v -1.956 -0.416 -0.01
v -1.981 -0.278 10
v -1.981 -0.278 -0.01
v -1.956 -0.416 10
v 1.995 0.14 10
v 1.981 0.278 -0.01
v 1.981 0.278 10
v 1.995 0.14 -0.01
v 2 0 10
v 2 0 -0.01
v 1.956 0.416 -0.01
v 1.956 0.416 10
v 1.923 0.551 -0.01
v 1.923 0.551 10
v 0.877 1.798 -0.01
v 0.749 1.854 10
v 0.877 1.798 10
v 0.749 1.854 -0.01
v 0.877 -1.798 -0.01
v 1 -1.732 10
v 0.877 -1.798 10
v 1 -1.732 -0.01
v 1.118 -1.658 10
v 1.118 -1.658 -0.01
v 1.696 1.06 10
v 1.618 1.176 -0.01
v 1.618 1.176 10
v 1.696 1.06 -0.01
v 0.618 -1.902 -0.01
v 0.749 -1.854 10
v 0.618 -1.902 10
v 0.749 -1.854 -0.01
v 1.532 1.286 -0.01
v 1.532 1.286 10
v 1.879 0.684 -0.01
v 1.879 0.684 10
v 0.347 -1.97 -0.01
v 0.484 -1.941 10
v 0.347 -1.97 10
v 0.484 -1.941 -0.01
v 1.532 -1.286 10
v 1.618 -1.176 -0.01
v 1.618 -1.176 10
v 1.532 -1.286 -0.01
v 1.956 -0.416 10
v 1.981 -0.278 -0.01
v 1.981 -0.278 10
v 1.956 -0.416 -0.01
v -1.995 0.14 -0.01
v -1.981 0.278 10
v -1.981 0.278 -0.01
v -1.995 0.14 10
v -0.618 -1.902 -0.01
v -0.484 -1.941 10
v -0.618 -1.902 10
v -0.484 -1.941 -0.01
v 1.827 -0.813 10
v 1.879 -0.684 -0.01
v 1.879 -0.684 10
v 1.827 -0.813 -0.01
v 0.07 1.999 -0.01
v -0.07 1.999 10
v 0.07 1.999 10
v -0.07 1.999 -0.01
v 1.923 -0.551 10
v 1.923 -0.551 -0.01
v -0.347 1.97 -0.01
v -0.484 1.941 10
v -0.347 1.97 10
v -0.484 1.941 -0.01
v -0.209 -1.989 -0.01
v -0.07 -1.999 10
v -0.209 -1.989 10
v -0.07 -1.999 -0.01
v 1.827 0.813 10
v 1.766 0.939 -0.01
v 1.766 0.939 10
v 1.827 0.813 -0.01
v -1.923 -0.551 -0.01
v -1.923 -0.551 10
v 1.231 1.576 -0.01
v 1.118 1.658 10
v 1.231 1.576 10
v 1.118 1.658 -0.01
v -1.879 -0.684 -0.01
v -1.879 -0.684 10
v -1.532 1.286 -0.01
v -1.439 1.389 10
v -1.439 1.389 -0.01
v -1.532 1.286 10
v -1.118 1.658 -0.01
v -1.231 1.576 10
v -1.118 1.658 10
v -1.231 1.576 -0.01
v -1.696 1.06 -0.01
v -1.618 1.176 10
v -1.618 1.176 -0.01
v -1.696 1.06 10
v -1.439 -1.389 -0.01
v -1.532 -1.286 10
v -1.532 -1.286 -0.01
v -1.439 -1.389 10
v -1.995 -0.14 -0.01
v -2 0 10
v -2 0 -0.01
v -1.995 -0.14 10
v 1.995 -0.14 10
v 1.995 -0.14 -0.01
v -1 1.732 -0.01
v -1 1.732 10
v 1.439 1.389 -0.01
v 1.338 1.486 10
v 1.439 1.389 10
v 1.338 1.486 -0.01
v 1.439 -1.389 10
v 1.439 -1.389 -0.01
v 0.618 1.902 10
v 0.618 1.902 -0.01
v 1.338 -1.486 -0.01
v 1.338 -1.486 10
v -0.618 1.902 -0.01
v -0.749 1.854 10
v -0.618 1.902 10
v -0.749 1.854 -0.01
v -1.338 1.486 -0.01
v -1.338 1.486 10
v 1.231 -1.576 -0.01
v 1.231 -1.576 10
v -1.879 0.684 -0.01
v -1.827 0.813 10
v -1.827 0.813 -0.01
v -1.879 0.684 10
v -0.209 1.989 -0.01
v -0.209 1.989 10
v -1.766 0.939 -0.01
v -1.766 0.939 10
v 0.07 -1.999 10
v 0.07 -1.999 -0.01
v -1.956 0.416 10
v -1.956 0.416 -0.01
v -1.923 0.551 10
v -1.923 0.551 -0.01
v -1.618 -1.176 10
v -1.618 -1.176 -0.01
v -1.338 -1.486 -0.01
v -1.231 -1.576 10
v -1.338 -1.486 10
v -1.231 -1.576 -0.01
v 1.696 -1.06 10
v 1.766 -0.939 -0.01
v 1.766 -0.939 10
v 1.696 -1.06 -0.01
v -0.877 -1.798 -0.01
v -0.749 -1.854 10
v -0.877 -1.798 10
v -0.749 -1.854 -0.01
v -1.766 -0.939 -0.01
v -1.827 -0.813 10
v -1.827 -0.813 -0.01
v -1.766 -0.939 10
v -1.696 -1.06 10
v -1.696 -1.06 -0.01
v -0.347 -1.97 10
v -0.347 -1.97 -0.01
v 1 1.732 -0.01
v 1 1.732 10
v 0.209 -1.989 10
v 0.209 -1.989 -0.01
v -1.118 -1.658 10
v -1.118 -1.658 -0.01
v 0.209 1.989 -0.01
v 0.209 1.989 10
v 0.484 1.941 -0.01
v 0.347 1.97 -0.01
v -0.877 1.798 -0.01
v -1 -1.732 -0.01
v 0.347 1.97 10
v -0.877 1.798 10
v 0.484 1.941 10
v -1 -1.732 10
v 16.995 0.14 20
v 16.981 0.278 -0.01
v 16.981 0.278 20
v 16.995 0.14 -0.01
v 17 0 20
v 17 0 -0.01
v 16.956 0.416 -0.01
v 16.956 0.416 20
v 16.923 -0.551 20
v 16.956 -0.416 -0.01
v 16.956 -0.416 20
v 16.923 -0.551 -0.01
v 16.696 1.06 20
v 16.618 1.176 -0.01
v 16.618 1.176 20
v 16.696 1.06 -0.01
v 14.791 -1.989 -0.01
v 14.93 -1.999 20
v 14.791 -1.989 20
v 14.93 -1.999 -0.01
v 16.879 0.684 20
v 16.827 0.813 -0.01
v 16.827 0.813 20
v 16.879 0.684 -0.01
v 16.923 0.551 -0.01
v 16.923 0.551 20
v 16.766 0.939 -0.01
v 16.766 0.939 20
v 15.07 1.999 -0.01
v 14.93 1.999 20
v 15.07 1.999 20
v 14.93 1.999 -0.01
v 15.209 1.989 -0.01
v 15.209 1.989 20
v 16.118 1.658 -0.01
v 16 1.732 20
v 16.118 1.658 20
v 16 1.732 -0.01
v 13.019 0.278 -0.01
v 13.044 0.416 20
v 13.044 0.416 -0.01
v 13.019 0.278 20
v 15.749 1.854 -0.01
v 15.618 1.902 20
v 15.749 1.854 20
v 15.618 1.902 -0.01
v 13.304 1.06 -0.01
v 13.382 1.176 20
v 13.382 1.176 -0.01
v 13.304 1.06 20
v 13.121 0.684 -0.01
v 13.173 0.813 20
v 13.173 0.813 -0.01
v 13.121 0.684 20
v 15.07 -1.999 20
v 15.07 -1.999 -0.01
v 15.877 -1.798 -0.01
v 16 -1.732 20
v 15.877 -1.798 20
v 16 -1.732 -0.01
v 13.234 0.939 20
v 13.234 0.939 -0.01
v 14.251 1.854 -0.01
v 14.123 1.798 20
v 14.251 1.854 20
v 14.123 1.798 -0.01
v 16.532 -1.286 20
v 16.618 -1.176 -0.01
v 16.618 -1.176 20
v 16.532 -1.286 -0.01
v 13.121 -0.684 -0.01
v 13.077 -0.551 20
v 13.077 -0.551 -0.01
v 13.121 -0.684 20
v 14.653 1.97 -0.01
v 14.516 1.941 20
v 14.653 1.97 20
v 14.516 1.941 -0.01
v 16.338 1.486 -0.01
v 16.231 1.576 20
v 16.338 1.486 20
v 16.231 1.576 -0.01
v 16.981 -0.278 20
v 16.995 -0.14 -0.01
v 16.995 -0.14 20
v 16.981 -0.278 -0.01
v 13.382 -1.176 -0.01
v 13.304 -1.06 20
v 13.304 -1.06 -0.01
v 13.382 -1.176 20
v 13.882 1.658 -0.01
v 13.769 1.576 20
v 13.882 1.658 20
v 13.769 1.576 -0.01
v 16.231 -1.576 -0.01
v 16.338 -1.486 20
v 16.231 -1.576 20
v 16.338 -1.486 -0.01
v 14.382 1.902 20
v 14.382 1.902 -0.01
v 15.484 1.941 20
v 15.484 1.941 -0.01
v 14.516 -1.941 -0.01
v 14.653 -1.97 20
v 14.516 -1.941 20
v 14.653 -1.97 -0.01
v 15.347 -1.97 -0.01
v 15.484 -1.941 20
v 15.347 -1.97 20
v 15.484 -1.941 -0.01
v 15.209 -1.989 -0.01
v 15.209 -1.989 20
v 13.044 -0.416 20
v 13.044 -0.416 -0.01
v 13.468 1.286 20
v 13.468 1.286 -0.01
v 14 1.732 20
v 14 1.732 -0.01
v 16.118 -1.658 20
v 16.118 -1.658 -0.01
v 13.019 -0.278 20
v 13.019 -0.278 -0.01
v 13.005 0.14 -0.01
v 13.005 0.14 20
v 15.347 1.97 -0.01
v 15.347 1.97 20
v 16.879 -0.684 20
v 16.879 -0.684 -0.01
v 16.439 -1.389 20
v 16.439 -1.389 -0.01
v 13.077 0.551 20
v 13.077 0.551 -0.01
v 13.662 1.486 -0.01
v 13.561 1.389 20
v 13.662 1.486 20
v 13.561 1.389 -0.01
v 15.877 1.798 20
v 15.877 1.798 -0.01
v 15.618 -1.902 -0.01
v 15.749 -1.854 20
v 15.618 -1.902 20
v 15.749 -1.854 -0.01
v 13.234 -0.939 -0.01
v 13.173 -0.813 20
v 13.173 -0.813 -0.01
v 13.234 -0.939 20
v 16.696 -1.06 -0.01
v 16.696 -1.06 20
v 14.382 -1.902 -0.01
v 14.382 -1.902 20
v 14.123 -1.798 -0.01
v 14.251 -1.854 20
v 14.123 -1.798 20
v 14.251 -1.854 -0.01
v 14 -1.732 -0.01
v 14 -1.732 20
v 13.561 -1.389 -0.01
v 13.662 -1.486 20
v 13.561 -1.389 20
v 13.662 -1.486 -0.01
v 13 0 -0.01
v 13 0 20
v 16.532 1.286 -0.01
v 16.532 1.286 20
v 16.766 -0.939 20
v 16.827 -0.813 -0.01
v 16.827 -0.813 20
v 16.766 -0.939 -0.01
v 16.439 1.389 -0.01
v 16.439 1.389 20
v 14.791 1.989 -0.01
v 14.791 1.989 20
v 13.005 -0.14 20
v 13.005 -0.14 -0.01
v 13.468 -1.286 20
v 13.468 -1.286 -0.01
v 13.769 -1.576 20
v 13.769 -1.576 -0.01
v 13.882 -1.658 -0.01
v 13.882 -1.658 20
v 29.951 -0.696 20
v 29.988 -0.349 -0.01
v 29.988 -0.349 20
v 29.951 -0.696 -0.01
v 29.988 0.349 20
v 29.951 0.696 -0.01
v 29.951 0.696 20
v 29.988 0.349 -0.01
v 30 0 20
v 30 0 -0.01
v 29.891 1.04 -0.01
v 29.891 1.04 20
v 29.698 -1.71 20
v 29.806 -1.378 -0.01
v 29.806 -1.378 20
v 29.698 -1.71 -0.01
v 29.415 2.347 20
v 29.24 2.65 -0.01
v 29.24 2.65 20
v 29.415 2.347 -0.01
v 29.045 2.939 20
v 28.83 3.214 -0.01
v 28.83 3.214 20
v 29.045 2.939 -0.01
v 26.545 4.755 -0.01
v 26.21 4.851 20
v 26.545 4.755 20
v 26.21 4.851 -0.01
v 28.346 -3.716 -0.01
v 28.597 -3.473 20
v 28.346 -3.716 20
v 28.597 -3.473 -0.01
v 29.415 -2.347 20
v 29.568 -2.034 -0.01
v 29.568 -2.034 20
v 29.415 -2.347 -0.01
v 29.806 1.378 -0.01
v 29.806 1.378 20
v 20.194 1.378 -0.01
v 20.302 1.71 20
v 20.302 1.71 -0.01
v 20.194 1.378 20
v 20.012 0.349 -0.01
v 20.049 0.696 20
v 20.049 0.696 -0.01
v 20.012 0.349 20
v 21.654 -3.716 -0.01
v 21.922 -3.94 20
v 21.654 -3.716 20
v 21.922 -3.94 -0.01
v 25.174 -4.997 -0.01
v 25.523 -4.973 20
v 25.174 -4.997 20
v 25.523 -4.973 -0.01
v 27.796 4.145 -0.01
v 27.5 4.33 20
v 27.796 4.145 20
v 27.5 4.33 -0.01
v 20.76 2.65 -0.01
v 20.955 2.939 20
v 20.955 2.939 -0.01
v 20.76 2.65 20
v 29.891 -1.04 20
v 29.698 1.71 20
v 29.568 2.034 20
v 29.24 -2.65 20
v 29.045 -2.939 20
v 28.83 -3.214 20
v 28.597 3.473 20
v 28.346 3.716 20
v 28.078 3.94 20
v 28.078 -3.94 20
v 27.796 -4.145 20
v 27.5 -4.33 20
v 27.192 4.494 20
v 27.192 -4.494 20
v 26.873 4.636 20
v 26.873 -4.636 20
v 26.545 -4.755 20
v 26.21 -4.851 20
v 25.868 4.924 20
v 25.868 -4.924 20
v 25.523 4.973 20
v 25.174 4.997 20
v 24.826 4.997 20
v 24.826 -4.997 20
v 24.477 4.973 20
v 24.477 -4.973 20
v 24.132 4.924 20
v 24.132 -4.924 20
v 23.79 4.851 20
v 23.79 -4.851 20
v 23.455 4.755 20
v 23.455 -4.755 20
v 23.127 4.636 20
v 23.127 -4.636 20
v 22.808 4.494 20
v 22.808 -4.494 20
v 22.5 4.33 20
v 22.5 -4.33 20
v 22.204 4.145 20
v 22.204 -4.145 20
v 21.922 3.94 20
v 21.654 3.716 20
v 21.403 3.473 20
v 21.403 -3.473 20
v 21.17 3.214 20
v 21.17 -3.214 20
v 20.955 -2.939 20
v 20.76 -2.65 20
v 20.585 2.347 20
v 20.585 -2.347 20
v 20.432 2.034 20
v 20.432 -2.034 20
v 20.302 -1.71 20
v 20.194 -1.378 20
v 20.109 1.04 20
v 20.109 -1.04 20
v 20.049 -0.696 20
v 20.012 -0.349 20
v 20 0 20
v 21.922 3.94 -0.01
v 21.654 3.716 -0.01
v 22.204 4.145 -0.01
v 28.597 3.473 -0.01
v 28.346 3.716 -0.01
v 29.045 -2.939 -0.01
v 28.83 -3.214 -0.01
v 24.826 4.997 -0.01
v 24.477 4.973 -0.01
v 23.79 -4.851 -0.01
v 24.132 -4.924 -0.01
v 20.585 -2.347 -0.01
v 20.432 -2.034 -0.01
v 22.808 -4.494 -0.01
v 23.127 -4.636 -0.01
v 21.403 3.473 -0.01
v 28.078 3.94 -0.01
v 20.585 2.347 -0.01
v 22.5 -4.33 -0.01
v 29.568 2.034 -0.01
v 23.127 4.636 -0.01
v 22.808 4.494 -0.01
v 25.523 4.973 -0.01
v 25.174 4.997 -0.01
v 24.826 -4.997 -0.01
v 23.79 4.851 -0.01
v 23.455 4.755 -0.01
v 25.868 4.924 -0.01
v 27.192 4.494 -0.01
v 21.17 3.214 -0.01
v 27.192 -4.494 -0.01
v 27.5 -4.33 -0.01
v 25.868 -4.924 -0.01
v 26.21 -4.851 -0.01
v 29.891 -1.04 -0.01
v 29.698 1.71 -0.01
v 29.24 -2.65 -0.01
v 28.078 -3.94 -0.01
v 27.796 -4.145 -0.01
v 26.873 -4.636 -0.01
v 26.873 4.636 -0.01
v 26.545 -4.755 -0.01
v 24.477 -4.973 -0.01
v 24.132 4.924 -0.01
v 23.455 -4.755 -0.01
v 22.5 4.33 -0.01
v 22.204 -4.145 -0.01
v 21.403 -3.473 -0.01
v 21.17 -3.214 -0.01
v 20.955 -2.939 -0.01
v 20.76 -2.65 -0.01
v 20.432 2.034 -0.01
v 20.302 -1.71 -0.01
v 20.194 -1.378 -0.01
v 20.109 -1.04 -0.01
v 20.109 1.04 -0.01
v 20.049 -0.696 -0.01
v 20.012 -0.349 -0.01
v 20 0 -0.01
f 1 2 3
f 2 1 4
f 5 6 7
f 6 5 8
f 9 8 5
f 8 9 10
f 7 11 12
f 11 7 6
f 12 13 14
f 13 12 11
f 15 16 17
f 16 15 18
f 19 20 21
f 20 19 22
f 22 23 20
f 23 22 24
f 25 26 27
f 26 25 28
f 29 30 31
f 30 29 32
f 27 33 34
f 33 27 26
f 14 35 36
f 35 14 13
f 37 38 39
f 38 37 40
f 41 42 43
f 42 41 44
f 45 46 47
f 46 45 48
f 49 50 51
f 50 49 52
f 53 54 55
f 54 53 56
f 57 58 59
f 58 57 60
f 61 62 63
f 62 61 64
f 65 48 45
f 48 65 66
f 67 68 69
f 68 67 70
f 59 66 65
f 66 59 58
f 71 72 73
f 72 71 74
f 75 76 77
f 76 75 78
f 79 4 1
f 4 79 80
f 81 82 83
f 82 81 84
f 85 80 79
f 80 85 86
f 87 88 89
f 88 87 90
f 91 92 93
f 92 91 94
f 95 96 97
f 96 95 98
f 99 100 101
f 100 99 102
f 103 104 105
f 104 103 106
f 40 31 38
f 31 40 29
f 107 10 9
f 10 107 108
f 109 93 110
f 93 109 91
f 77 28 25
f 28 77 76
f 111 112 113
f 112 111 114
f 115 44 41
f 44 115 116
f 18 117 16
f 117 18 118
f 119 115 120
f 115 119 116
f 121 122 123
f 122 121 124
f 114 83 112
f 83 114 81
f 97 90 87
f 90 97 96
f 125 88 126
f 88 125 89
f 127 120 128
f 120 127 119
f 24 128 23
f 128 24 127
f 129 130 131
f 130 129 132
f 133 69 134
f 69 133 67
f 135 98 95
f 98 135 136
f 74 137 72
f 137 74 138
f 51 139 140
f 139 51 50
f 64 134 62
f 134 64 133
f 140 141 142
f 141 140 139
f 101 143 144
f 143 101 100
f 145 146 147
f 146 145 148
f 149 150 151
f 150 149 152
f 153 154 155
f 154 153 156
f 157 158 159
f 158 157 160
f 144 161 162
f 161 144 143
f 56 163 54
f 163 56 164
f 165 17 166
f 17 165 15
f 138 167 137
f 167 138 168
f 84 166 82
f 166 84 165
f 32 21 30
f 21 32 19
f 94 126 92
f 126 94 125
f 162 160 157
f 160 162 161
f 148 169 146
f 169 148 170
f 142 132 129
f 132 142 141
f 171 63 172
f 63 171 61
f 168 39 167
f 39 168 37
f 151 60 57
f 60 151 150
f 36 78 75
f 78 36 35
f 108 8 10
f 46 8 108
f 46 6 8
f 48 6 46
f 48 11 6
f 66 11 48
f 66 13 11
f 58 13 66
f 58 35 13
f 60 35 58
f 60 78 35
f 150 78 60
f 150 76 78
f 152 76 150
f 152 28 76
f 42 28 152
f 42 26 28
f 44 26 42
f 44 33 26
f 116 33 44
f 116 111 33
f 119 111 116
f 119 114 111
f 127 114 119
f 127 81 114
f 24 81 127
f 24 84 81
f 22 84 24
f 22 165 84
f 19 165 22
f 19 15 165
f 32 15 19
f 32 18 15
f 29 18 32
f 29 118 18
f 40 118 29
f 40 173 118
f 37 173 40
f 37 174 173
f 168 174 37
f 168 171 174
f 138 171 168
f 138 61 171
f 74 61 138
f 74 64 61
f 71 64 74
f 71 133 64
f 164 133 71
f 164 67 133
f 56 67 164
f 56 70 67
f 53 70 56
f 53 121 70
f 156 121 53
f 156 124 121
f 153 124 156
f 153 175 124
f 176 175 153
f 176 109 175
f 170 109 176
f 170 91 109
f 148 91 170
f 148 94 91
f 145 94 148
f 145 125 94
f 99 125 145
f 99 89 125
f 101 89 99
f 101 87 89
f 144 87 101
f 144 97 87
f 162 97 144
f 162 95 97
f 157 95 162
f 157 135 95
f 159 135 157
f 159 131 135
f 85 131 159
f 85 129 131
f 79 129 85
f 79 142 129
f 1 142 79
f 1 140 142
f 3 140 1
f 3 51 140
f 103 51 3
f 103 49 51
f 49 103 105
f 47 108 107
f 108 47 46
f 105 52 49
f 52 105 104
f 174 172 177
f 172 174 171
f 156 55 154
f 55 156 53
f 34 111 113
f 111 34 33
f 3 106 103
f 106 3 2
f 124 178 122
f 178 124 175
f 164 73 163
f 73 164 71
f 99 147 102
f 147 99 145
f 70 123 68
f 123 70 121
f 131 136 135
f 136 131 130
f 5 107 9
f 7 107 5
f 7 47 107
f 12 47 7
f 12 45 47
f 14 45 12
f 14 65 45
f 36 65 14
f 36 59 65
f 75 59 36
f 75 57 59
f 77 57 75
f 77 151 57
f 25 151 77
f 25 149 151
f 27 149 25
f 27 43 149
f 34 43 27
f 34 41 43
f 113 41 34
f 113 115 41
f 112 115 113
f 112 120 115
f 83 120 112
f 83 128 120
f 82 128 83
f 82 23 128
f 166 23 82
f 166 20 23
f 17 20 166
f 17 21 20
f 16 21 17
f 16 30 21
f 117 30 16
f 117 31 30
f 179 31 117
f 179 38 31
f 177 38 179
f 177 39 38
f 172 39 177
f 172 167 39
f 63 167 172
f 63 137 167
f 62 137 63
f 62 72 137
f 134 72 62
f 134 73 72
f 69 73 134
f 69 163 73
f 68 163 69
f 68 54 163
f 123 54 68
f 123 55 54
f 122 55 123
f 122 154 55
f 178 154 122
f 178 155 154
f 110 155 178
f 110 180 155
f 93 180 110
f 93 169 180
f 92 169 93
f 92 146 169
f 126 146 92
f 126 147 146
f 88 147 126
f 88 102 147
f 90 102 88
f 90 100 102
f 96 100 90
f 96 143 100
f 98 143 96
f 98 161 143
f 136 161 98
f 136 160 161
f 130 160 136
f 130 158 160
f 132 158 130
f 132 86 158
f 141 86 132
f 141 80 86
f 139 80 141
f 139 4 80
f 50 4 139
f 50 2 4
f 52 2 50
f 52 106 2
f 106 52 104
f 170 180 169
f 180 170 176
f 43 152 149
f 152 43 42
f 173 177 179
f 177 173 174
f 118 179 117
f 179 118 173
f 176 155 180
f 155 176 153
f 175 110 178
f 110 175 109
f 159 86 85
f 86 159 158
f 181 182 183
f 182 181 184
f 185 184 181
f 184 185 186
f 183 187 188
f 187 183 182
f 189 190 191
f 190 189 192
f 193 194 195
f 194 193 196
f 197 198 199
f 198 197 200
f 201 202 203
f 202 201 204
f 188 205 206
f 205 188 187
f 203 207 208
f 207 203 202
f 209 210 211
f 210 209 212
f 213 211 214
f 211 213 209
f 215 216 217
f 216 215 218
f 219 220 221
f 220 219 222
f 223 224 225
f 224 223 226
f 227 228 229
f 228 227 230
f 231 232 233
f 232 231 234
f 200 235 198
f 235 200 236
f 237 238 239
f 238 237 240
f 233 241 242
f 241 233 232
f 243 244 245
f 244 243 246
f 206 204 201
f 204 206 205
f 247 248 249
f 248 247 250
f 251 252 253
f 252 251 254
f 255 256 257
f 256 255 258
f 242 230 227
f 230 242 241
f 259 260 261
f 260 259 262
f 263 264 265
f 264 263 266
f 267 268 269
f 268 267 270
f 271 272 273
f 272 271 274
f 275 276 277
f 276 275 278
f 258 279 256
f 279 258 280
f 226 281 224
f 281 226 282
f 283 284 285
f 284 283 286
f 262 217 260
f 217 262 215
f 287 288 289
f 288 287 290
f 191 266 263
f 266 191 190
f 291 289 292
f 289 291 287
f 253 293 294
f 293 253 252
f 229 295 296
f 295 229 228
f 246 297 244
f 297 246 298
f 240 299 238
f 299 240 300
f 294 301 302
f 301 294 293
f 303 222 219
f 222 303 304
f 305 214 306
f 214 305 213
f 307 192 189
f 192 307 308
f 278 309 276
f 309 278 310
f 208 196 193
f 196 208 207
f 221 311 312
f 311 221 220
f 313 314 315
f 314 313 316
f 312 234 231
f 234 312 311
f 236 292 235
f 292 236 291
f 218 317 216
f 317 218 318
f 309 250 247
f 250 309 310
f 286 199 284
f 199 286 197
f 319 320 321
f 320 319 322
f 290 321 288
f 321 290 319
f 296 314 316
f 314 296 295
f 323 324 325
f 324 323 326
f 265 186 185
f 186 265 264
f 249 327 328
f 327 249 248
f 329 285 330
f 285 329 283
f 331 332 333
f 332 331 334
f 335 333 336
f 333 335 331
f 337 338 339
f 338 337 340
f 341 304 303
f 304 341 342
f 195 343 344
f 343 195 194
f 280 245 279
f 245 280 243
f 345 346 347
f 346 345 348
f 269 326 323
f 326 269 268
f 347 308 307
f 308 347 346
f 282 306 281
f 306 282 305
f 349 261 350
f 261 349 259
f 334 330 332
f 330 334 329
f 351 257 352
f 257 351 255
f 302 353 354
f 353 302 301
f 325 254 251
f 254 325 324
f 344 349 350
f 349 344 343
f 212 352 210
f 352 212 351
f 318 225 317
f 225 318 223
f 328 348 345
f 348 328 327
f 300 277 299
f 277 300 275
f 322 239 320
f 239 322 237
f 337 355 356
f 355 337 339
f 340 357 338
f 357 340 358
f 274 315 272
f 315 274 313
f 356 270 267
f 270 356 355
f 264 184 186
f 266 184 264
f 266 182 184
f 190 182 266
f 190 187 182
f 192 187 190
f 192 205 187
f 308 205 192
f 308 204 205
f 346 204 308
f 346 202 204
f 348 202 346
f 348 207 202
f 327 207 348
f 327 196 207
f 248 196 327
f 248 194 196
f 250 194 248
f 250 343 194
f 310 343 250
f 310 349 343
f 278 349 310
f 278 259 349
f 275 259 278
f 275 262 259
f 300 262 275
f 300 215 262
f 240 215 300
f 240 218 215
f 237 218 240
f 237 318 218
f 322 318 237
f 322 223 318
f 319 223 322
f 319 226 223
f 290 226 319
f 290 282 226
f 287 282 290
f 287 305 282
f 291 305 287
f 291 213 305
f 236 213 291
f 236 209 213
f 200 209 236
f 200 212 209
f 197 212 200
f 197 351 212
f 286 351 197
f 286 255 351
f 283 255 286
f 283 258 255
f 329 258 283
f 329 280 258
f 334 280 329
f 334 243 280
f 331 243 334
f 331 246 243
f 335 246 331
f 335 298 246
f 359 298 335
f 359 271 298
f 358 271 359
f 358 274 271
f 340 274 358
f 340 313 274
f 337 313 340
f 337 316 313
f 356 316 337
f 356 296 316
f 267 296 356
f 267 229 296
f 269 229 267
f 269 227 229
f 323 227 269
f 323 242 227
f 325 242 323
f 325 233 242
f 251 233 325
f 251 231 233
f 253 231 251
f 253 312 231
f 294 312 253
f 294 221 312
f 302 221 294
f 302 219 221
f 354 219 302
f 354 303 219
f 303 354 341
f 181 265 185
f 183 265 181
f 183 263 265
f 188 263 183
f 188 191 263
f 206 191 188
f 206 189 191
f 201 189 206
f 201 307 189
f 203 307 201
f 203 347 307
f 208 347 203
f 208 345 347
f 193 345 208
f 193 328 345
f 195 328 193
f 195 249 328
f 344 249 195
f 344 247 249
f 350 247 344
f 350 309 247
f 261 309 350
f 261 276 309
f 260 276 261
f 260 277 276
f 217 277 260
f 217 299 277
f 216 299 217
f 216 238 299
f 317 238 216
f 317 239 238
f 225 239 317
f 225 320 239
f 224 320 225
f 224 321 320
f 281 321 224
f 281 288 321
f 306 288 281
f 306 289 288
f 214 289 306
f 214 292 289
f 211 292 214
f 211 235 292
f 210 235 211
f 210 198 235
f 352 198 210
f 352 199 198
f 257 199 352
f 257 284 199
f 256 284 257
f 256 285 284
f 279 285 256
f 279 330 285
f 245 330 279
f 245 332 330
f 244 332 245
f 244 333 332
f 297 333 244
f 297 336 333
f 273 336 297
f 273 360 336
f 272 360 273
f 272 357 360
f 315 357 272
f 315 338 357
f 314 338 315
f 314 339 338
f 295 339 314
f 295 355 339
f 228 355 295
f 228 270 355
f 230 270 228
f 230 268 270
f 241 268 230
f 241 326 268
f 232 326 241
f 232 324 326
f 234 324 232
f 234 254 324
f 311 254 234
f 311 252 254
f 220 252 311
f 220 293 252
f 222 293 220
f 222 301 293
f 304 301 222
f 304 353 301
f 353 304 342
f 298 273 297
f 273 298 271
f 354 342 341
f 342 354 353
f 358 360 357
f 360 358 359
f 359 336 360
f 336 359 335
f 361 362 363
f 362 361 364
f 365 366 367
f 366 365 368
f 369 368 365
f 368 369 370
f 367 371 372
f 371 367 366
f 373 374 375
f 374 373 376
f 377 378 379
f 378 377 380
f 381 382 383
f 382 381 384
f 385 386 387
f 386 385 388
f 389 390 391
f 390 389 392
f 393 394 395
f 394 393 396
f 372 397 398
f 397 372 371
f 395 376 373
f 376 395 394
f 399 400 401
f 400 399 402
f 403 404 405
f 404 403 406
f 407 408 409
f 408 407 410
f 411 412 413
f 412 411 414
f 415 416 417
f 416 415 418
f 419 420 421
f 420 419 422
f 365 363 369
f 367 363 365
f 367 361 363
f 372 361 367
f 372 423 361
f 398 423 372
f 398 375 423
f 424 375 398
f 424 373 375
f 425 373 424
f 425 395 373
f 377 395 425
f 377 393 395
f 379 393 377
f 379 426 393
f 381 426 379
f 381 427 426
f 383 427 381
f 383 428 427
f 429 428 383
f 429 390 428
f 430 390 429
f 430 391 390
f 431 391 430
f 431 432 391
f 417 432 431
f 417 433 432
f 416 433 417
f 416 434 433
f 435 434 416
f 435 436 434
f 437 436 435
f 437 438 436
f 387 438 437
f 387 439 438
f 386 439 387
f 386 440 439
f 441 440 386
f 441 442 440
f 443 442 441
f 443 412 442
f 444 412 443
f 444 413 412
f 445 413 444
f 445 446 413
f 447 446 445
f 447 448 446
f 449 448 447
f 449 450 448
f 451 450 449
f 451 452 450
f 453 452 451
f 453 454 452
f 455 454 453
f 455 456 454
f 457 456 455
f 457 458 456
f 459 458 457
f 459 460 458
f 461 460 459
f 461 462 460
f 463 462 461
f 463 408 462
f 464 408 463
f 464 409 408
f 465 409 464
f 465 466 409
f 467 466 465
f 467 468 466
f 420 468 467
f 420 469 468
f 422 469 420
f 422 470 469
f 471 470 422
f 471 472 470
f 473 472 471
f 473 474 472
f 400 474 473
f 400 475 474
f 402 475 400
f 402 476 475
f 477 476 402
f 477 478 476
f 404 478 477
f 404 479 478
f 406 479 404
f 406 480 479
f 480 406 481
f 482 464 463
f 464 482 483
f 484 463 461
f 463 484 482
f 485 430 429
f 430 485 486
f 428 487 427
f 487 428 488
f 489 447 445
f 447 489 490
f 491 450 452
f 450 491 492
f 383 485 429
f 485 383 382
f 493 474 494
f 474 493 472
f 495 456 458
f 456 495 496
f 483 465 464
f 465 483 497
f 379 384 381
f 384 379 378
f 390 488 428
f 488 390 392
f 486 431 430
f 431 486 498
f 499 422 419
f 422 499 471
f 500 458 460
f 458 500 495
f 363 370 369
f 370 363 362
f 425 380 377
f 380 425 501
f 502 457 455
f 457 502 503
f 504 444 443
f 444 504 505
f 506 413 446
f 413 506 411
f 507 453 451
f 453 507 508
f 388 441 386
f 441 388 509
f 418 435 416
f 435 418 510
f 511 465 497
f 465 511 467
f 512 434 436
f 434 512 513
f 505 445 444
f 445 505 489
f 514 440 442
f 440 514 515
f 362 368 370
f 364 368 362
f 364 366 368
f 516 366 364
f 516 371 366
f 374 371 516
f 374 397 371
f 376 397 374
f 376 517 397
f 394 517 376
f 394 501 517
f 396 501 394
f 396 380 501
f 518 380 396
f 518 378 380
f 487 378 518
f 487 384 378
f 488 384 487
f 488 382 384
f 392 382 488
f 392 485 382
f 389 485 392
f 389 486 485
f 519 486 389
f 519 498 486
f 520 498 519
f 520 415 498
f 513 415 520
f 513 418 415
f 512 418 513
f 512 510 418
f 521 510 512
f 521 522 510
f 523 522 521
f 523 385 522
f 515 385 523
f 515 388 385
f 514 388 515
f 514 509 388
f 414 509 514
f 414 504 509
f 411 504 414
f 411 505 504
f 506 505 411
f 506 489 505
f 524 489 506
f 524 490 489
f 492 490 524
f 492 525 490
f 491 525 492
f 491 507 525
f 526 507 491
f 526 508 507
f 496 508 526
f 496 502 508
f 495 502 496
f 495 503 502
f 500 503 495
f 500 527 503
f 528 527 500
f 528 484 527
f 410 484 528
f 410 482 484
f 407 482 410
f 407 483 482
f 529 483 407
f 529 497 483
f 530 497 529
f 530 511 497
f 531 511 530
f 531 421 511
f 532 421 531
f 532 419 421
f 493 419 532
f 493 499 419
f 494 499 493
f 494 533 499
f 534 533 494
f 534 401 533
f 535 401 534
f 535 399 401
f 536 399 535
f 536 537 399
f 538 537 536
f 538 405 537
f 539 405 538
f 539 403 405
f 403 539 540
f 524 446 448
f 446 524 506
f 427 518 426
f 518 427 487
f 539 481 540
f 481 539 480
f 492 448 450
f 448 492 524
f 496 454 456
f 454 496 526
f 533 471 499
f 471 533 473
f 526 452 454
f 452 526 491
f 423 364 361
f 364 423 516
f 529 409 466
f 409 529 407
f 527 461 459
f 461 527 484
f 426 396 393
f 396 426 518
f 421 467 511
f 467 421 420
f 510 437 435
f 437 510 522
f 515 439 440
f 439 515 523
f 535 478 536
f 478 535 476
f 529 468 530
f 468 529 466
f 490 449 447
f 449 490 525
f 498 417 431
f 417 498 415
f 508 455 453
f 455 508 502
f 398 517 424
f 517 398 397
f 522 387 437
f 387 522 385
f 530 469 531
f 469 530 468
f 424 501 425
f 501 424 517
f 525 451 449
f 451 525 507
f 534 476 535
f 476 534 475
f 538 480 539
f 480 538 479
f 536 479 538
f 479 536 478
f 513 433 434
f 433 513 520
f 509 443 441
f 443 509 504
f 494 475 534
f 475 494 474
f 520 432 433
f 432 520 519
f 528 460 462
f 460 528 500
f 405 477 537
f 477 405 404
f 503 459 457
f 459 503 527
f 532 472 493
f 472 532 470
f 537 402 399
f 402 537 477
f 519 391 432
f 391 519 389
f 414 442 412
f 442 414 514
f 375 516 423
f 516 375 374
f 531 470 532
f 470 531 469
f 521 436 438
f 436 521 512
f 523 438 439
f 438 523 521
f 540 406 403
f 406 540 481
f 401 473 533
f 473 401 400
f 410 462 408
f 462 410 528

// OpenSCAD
// file: ../../Base/Rotation.scad
// Fischertechnik Box Foundation
// Geometry Helpers Rotation

include <PlacementOptions.scad>

// getRotatedSpace(space, rotation=NoRotation)
// Rotates the space dependent on the specified rotation

function getRotatedSpace(space, rotation=NoRotation) = [
    (rotation == Rotate90 || rotation == Rotate270) ? space.y : space.x,
    (rotation == Rotate90 || rotation == Rotate270) ? space.x : space.y
];

// Rotates the given space around the fixed left lower corner
// space = the space the children needs as width/depth list [width,depth]
// rotation = 0 Rotate0 degrees, 1 Rotate90 degrees, 2 Rotate180 degrees, 3 Rotate270 degrees (equivalent to -90)

module RotateFix(space, rotation=Rotate0) {
    dy = (rotation == Rotate0 || rotation == Rotate270) ? 0 :
        (rotation == Rotate90) ? space.x :
        space.y;
    dx = (rotation < Rotate180) ? 0 :
        (rotation == Rotate180) ? space.x :
        space.y;
    
    translate([dx, dy, 0])
        rotate([0, 0, rotations[rotation]])
            children();
}
// file: ../../Base/Alignment.scad
// Fischertechnik Box Foundation
// Geometry Helpers Alignment

include <PlacementOptions.scad>

// getAlignedX(elementWidth, spaceWidth, align=AlignRight, offset=0)
// Gets the aligned X offset of an element with the given
// width in the given space.
// elementWidth = The width of the element to positon
// spaceWidth = The space where the element should be aligned
// align = 0 AlignLeft, 1 AlignCenter, 2 AlignRight
// offset = an optional offset from the aligned position. When
// aligned left or centered, then positive values are in X direction.
// When aligned right then positive values are in negative X direction.

function getAlignedX(elementWidth, spaceWidth, align=AlignRight, offset=0) =
    (align == AlignLeft) ?
        offset :
        ((align == AlignCenter) ?
        (spaceWidth - elementWidth)/2 + offset :
        spaceWidth - offset - elementWidth);

// getAlignedY(elementDepth, spaceDepth, align=AlignTop, offset=0)
// Gets the aligned Y offset of an element with the given
// depth in the given space.
// elementDepth = The depth of the element to positon
// spaceDepth = The space where the element should be aligned
// align = 0 AlignBottom, 1 AlignCenter, 2 AlignTop
// offset = an optional offset from the aligned position. When
// aligned bottom or centered, then positive values are in Y direction.
// When aligned top then positive values are in negative Y direction.

function getAlignedY(elementDepth, spaceDepth, align=AlignTop, offset=0) =
    (align == AlignBottom) ?
        offset :
        ((align == AlignCenter) ?
        (spaceDepth - elementDepth)/2 + offset :
        spaceDepth - offset - elementDepth);
// file: ../../Base/PlacementOptions.scad
// Fischertechnik Box Foundation
// Placement Options

// Alignment
NoAlign = 0;
AlignLeft = 1;
AlignBottom = 2;
AlignCenter = 3;
AlignRight = 4;
AlignTop = 5;

// Element rotation degree steps
rotations = [0, -90, -180, -270];

// Rotation
NoRotation = 0;
Rotate0 = 0;
Rotate90 = 1;
Rotate180 = 2;
Rotate270 = 3;

// Docking (seen from above)
NoDock = -1;
DockLeft = 0;
DockTop = 1;
DockRight = 2;
DockCorner = 2;
DockBottom = 3;

// Web corners
LowerLeft = 0;
UpperLeft = 1;
UpperRight = 2;
LowerRight = 3;

// Web position relative to corner
LeftOfCorner = 0;
RightOfCorner = 1;
// file: ../../Base/Boxes.scad
// Fischertechnik Box Foundation
// Pre-designed Boxes

use <Constants.scad>

include <PlacementOptions.scad>

box190Width = 190;
box190Depth = 130;
box130Width = 130;
box130Depth = 95;
boxUsageHeight = 33.9;
boxWallThickness = 2.4;
boxBaseThickness = 1.0;
boxWebWidth = 3.0;

// getBoxWallThickness()
// Gets the wall thickness of a Fischertechnik Box

function getBoxWallThickness() = boxWallThickness;

// Gets the usable height of a fischertechnik box
function getBoxUsageHeight() = boxUsageHeight;

// Gets the thickness of the Fischertechnik box base.
function getBoxBaseThickness() = boxBaseThickness;

// Gets the width of a box web
function getBoxWebWidth() = boxWebWidth;

// Gets the usable inner space of a Box 190 as an x/y-list
function getBox190Space() = [
    box190Width - 2*getBoxWallThickness(), 
    box190Depth - 2*getBoxWallThickness() ];

// Imports the Fischertechnik empty box 130x190 mm and places it at position 0,0
// 190x130 are the outer sizes, the inner space is slightly smaller. Use getBox190Space() to get the inner sizes.
// This module needs the STL file "Fischertechnik Box 130x190.stl" in the library path.
// The box is positioned that the usable inner space is at the 0,0,0 position. The

module Box190() {
    translate([-getBoxWallThickness(),-getBoxWallThickness(),-getBoxBaseThickness()])
        import("Fischertechnik Box 130x190.stl", convexity=3);
}

// Gets the usable inner space of a Box 130 as an x/y-list
function getBox130Space() = [
    box130Width - 2*getBoxWallThickness(), 
    box130Depth - 2*getBoxWallThickness() ];

// Imports the Fischertechnik empty box 95x130 mm and places it at position 0,0
// 190x130 are the outer sizes, the inner space is slightly smaller. Use getBox190Space() to get the inner sizes.
// This module needs the STL file "Fischertechnik Box 95x130.stl" in the library path.
// The box is positioned that the usable inner space is at the 0,0,0 position. The

module Box130() {
    translate([-getBoxWallThickness(),-getBoxWallThickness(),-getBoxBaseThickness()])
        import("Fischertechnik Box 95x130.stl", convexity=3);
}

// Creates a web at the specified box walls
// corner 0 = LowerLeft, 1 = UpperLeft, 2 = UpperRight, 3 = LowerRight
// side 0 = LeftOfCorner, 1 = RightOfCorner
// distance = Distance in mm from the corner
// boxSpace = inner width and depth of the box (default: Box 190)
// webWidth = length of the web (default is 3 mms)
// webThickness = thickness of the web (default is 1 mm)

module BoxWeb(corner, side, distance, boxSpace=getBox190Space(), webWidth=getBoxWebWidth(), webThickness=1.0) {
    sink = getBoxWallThickness()/2;

    width = (corner % 2 == 0) ? 
            (side == LeftOfCorner ? webWidth : webThickness) :
            (side == LeftOfCorner ? webThickness : webWidth);

    depth = (corner % 2 == 0) ? 
            (side == RightOfCorner ? webWidth : webThickness) :
            (side == RightOfCorner ? webThickness : webWidth);
    
    xDiff = corner == LowerLeft ? 
                (side == LeftOfCorner ? -sink : distance) :
            (corner == UpperLeft ?                
                (side == LeftOfCorner ? distance : -sink) :
            (corner == UpperRight ?
                (side == LeftOfCorner ? boxSpace.x-webWidth+sink : boxSpace.x-distance-webThickness) :
                (side == LeftOfCorner ? boxSpace.x-distance-webThickness: boxSpace.x-webWidth+sink)));

    yDiff = corner == LowerLeft ? 
                (side == RightOfCorner ? -sink : distance) :
            (corner == UpperLeft ?
                (side == RightOfCorner ? boxSpace.y-distance : boxSpace.y-webWidth+sink) :
            (corner == UpperRight ?
                (side == RightOfCorner ? boxSpace.y-webWidth+sink : boxSpace.y-distance) :
                (side == RightOfCorner ? distance : -sink)));
    
    translate([xDiff, yDiff, -getExcess()])
        cube([width, depth, boxUsageHeight + 2*getExcess()]);
}
// file: ../../Base/Placement.scad
// Fischertechnik Box Foundation
// Geometry Helpers Placement

use <Constants.scad>
use <Alignment.scad>
use <Rotation.scad>
use <Boxes.scad>

include <PlacementOptions.scad>

// Place(x=0, y=0, elementSpace=[0,0], alignX=AlignLeft, alignY=AlignBottom, rotation=Rotate0, boxSpace=getBox190Space())
// Places the child at the specified position
// y = Y-Position. This is a relative position when an X aligment is specified.
// x = X-Position. This is a relative position when an Y aligment is specified.
// elementSpace = space of the element to be placed [x,y]
// alignX = -1=NoAlign, 0 AlignLeft, 1 AlignCenter, 3 AlignRight (elementSpace and boxSpace required!)
// alignY = -1=NoAlign, 2 AlignBottom, 1 AlignCenter, 4 AlignTop (elementSpace and boxSpace required!)
// rotation = 0 Rotate0 0 degrees, 1 Rotate90 90 degrees, 
// 2 Rotate180 180 degrees, 3 Rotate270 270 degrees (equivalent to -90)
// boxSpace = Inner space of the box where the placement occurs [x,y] - default is Box 190x130 inner space

module Place(x=0, y=0, elementSpace=[0,0], 
  alignX=AlignLeft, alignY=AlignBottom, 
  rotation=NoRotation, boxSpace=getBox190Space()) {

    module Position(x, y, space, rotation=Rotate0) {
        translate([x, y, 0])
            RotateFix(space, rotation)
                children();
    }

    space = getRotatedSpace(elementSpace, rotation);
    alignedX = getAlignedX(space.x, boxSpace.x, alignX, x);
    alignedY = getAlignedY(space.y, boxSpace.y, alignY, y);
    Position(alignedX, alignedY, elementSpace, rotation)
        children();
}

// Center(space=getBox130Space(), elementSpace=[0,0])
// space = Space where the children is centered. For cylinder use centered=true and no elementSpace.
// elementSpace = space of the element to be centered [x,y]

module Center(space=getBox190Space(), elementSpace=[0,0]) {
    Place(elementSpace=elementSpace, boxSpace=space, alignX=AlignCenter, alignY=AlignCenter)
        children();
}

// CenterHorizontal(width=0, y=0, offset=0, space=getBox130Space())
// width = Width of the element to be placed.
// y = Y position of the element
// offset = Offset from the center position (negative will be left of the center)
// space = Space where the element is placed

module CenterHorizontal(width=0, y=0, offset=0, space=getBox190Space()) {
    Place(x=offset, y=y, elementSpace=[width, 0], boxSpace=space, alignX=AlignCenter)
        children(0);
}

// CenterVertical(depth=0, x=0, offset=0, space=getBox130Space())
// depth = Depth of the element to be placed.
// x = X position of the element
// offset = Offset from the center position (negative will be down of the center)
// space = Space where the element is placed

module CenterVertical(depth=0, x=0, offset=0, space=getBox190Space()) {
    Place(x=x, y=offset, elementSpace=[0, depth], boxSpace=space, alignY=AlignCenter)
        children(0);
}

// getIsVertical(align)
// True if the specified alignment needs a vertical orientation for a divider (AlignRight, AlignLeft)

function getIsVertical(align) = (align == AlignRight || align == AlignLeft);

// getIsHorizontal(align)
// True if the specified alignment needs a horizontal orientation for a divider (AlignTop, AlignBottom)

function getIsHorizontal(align) = (align == AlignTop || align == AlignBottom);
// file: ../../Base/Constants.scad
// Fischertechnik Box Foundation
// Constants

// Constant values necessary for multiple elements

// Base constants
dividerThickness = 1.2;
excess = 0.01;
fragments = 90;
tolerance = 0.8;

// Gets the thickness of a divider 
function getDividerThickness() = dividerThickness;

// Gets the excess that is used to merge walls into each other
function getExcess() = excess;

// Gets amount of fragments of a cylinder
function getFragments() = fragments;

// Gets the inner tolerance of a frame to each side
function getTolerance() = tolerance;


// Fischertechnik specific constants
axisDiameter = 4;
axisBottomDiameter = axisDiameter + 1;
standardEdgeDistance = 2.5;
standardWebDistance = 11.5;
standardCornerLength = 15;
tubeWallFactor = 0.8;
smallPartsFrameHeight = 20;

// Gets axis diameter
function getAxisDiameter() = axisDiameter;

// Gets axis bottom diameter for thicker part at the bottom
function getAxisBottomDiameter() = axisBottomDiameter;

// gets the standard distance to the wall of the box for dockable frames with webs
function getStandardEdgeDistance() = standardEdgeDistance;

// gets the standard distance of each web to the corner of the dockable frame
function getStandardWebDistance() = standardWebDistance;

// gets the standard length of the corner walls of a dockable frame
function getStandardCornerLength() = standardCornerLength;

// gets the wall thickness of a tube.
function getTubeWallThickness() = tubeWallFactor * getDividerThickness();

// gets the frame height for docked small parts boxes.
function getSmallPartsFrameHeight() = smallPartsFrameHeight;
// main file
// Fischertechnik Box Foundation
// ModelBase
// Test Axis

use <../../ModelBase/Simple.scad>

Axis(10);

translate([15, 0, 0])
    Axis(20);

translate([25, 0, 0])
    Axis(20, diameter=10);
